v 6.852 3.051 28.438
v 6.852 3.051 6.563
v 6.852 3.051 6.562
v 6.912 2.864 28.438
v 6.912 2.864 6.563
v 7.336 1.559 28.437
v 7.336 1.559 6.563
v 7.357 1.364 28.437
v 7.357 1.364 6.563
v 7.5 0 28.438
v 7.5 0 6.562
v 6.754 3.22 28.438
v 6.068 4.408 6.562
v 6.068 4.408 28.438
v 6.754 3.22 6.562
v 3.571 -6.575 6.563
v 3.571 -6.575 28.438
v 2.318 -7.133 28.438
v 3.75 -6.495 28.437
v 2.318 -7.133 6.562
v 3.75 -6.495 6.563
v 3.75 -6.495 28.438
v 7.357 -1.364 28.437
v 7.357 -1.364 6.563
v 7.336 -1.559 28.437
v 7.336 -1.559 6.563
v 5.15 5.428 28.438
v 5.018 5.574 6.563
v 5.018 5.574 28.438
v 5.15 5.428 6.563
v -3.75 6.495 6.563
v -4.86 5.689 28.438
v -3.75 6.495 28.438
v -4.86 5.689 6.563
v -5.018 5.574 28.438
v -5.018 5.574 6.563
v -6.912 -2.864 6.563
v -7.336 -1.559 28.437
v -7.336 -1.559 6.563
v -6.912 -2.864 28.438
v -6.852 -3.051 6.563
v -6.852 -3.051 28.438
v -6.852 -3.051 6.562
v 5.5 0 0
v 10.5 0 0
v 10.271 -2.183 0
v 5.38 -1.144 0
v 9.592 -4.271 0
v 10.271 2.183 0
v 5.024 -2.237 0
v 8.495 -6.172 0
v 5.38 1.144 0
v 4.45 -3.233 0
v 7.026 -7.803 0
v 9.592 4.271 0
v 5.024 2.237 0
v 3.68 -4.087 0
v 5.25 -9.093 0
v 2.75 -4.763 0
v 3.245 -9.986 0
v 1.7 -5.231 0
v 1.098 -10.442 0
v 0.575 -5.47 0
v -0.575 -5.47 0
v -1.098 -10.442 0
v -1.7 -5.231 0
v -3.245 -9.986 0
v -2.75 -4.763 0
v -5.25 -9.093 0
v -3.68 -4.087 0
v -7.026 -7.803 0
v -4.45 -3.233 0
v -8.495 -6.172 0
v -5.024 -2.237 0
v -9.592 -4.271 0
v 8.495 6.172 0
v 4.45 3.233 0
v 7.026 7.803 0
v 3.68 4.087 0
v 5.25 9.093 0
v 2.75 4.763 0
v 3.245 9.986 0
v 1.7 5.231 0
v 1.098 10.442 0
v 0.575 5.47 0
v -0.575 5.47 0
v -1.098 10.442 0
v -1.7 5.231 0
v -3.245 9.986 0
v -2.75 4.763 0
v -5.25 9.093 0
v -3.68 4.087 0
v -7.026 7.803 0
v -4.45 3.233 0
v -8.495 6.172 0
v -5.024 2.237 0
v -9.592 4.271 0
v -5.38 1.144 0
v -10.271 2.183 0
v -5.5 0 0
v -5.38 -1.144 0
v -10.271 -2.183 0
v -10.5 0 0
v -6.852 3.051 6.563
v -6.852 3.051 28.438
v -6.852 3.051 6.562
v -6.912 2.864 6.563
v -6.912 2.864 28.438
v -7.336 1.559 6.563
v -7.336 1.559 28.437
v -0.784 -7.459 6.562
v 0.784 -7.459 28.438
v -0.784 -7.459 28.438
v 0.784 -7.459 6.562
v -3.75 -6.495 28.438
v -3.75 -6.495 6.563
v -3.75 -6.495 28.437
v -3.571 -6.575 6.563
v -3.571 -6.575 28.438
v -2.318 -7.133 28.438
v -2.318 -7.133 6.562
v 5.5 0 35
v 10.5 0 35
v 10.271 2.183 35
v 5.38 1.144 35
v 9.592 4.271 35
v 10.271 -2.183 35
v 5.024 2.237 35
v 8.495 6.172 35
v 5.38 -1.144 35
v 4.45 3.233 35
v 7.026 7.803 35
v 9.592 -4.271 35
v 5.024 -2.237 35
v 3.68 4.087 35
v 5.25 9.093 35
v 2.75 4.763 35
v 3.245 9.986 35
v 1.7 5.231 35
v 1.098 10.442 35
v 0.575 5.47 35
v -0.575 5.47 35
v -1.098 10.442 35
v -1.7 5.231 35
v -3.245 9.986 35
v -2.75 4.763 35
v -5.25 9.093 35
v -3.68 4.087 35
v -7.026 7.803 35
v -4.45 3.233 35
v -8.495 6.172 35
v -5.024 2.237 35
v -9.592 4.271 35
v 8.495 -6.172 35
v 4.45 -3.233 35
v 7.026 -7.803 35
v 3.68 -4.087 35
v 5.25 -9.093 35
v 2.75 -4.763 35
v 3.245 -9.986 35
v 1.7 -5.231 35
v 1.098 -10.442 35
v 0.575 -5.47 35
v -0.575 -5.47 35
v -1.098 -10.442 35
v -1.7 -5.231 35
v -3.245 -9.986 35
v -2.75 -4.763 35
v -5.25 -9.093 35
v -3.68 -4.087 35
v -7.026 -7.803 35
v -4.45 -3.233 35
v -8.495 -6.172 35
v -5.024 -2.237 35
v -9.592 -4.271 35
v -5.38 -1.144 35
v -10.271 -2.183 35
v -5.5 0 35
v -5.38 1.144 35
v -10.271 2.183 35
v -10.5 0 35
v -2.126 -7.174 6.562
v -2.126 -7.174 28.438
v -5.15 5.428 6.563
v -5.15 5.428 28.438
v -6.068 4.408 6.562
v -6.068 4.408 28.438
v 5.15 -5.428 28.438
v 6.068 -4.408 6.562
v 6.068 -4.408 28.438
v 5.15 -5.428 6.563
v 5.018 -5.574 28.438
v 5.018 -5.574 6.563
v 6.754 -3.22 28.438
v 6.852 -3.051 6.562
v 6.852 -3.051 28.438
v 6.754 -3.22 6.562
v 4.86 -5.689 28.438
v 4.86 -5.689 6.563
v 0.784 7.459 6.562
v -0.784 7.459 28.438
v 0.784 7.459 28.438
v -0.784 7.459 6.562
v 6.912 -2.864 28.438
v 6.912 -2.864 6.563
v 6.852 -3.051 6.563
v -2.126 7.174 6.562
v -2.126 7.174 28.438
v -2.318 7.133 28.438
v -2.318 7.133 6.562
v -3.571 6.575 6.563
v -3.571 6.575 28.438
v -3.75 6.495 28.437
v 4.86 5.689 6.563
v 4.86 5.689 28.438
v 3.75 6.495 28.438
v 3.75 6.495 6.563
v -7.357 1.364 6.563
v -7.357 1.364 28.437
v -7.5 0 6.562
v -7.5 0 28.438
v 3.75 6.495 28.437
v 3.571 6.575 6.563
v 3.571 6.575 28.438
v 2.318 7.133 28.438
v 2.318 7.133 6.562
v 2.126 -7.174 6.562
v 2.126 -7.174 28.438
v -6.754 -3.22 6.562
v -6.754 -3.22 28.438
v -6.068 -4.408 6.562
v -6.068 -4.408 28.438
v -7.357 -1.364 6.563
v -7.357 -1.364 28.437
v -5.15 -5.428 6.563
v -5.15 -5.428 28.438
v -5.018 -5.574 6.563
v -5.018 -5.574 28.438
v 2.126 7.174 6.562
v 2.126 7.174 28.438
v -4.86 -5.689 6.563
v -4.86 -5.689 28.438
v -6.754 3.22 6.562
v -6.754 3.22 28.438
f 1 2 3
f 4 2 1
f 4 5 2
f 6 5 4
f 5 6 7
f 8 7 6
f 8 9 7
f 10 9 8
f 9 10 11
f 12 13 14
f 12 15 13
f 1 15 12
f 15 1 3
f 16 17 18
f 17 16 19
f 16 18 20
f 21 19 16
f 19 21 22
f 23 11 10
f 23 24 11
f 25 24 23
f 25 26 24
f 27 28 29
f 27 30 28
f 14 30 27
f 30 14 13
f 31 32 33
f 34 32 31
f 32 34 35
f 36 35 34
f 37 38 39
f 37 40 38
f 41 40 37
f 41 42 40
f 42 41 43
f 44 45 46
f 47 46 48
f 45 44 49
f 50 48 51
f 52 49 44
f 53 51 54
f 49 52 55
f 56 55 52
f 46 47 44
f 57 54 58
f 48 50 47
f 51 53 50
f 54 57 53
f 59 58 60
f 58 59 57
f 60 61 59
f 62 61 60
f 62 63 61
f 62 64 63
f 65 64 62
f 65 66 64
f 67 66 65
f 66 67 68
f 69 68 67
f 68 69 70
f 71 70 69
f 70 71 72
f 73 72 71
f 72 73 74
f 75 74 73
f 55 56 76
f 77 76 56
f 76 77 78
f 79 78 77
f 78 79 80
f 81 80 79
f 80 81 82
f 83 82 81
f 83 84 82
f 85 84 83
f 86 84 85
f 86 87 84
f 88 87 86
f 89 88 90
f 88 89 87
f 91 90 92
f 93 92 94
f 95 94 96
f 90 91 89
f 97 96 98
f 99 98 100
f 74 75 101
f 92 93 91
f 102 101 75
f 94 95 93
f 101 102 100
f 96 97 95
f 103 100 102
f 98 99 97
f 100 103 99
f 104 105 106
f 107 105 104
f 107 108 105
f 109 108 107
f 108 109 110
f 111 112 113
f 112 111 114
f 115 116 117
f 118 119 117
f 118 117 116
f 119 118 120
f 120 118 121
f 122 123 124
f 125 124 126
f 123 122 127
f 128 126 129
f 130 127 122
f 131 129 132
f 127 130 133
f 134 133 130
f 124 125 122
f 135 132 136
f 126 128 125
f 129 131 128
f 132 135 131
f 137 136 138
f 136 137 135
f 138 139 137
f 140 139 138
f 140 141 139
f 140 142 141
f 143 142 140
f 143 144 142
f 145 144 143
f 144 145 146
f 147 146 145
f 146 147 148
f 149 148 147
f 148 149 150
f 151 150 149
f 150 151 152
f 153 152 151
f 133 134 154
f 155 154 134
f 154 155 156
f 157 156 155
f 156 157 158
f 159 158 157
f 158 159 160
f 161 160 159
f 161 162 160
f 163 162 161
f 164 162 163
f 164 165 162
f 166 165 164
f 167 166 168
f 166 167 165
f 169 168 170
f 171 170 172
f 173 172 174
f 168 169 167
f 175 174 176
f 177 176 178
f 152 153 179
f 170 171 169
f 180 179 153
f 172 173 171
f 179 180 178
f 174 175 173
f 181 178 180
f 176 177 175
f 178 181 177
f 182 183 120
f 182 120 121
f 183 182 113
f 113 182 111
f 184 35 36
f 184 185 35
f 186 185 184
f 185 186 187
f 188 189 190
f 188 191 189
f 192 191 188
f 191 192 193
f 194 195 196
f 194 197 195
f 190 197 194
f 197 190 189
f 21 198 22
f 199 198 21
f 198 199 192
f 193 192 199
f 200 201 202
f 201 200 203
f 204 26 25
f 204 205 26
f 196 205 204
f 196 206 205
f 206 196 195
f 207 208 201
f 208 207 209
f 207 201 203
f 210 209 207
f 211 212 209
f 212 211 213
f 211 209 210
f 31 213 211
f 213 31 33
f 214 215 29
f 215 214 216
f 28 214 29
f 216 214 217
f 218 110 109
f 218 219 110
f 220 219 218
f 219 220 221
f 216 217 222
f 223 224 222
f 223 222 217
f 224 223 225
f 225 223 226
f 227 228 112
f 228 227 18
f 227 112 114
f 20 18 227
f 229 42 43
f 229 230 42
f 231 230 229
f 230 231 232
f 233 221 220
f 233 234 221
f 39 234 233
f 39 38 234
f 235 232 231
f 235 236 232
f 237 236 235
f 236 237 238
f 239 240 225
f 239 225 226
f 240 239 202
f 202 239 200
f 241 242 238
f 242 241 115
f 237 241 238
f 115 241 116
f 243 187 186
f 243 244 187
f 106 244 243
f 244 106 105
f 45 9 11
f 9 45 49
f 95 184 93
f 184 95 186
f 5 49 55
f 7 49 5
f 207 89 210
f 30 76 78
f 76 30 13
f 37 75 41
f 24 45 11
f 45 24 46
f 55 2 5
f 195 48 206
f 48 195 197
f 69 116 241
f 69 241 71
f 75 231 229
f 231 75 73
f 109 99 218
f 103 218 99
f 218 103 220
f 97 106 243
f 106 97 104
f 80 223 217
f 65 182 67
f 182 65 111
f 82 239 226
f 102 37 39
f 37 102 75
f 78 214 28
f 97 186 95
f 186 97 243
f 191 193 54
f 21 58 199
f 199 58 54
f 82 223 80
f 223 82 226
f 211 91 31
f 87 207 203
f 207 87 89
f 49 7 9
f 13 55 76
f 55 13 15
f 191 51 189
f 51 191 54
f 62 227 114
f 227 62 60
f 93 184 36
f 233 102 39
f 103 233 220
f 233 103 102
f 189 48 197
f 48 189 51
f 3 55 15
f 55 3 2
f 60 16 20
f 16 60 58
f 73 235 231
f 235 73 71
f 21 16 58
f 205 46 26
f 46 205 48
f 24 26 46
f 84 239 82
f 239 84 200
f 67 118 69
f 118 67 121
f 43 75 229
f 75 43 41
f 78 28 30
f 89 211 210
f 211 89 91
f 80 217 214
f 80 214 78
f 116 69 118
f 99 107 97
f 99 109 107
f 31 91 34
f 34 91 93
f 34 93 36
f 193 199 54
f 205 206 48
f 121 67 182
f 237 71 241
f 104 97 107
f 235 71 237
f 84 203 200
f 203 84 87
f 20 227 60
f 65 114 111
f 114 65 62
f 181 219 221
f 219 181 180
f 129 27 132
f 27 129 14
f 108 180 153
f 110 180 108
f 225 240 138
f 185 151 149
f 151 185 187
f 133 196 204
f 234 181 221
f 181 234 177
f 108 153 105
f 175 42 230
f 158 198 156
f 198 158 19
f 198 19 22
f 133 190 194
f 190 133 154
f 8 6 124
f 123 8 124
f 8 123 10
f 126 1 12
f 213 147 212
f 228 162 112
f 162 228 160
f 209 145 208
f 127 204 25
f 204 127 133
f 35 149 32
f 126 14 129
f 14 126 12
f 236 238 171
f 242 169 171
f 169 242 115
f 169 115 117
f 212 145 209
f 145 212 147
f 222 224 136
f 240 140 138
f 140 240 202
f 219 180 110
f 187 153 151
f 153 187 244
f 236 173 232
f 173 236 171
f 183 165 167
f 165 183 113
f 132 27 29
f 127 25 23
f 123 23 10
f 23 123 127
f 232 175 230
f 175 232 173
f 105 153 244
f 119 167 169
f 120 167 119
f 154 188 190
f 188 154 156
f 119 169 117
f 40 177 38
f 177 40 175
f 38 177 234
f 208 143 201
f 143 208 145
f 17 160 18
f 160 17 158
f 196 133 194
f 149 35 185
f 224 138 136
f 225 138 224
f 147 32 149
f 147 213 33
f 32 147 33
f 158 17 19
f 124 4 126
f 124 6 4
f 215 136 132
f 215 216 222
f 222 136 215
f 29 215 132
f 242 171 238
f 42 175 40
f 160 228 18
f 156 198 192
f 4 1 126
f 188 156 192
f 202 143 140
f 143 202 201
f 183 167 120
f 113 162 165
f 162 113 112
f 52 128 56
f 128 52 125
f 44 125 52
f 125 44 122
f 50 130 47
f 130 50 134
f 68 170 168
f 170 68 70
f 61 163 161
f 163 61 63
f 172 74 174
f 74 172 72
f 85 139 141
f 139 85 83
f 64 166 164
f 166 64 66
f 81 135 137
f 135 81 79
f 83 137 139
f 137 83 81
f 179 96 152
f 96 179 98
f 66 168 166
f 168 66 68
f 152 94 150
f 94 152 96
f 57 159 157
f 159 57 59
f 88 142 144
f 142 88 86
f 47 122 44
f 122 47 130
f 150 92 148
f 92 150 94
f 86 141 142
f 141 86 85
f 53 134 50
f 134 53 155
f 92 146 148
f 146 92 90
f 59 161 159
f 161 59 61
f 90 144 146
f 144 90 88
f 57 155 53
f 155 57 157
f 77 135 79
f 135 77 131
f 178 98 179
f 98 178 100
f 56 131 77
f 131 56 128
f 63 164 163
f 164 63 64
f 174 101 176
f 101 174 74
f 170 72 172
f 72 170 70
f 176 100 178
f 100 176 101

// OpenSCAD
// file: settings.scad
//
//$fn = 100;
$fn = 30;

///// You can change these values easily /////

frame_x =5*25.4;
frame_y = frame_x;
frame_rod_diameter=8;

bearing_diameter = 0.177*25.4; // .177 caliber BB
//bearing_diameter = 30; // marble

hole_diameter = 20; // Hollow center diameter

screw_diameter = 4;
screw_hole_diameter =  screw_diameter * 1.3;

number_of_screws = 4;
inner_number_of_screws = 6;


///// You can change these values with some thought /////

raceway_thickness = bearing_diameter * .8 ;

screw_inset = screw_hole_diameter /2;
//screw_inset=0;
raceway_inset = screw_inset;
//raceway_inset=0;



    bearing_race_diameter = 
    hole_diameter
    + screw_inset*4
    + screw_hole_diameter*2
    + raceway_inset*2
    + bearing_diameter
    ;

    raceway_diameter =
    bearing_race_diameter
    + bearing_diameter
    + raceway_inset*2
    ;

    inner_raceway_hole_diameter = 
    hole_diameter
    + screw_inset*4
    + screw_hole_diameter*2
    ;
    
    inner_raceway_diameter =
    bearing_race_diameter
    + bearing_diameter
    + raceway_inset*2
    + screw_inset*2
    + screw_hole_diameter*2
   ;

//spool
spool_d = 15; // main cylinder diameter
spool_h = 35; // main cylinder height
spool_hole = spool_d - 4; // hole diameter
spool_slope=1/6; // angle of conical section
// main file
include <settings.scad>;

module spool(
    spool_d = spool_d,
    spool_h = spool_h,
    spool_hole = spool_hole,
    spool_slope = spool_slope
    ) {

flange_ratio=.7;

    difference() {
    union() {

        translate([0,0,spool_h/2])
        cylinder(r=spool_d/2, h=spool_h, center=true);


        translate([0,0,spool_h/4])
        cylinder(r1=spool_d*flange_ratio, r2=spool_d*spool_slope, h=spool_h/2, center=true);

        translate([0,0,spool_h/2+spool_h/4])
        rotate(180,[0,1,0])
        cylinder(r1=spool_d*flange_ratio, r2=spool_d*spool_slope, h=spool_h/2, center=true);
    }

    translate([0,0,spool_h/2])
    cylinder(r=spool_hole/2, h=spool_h*2, center=true);
    }

}

spool();
